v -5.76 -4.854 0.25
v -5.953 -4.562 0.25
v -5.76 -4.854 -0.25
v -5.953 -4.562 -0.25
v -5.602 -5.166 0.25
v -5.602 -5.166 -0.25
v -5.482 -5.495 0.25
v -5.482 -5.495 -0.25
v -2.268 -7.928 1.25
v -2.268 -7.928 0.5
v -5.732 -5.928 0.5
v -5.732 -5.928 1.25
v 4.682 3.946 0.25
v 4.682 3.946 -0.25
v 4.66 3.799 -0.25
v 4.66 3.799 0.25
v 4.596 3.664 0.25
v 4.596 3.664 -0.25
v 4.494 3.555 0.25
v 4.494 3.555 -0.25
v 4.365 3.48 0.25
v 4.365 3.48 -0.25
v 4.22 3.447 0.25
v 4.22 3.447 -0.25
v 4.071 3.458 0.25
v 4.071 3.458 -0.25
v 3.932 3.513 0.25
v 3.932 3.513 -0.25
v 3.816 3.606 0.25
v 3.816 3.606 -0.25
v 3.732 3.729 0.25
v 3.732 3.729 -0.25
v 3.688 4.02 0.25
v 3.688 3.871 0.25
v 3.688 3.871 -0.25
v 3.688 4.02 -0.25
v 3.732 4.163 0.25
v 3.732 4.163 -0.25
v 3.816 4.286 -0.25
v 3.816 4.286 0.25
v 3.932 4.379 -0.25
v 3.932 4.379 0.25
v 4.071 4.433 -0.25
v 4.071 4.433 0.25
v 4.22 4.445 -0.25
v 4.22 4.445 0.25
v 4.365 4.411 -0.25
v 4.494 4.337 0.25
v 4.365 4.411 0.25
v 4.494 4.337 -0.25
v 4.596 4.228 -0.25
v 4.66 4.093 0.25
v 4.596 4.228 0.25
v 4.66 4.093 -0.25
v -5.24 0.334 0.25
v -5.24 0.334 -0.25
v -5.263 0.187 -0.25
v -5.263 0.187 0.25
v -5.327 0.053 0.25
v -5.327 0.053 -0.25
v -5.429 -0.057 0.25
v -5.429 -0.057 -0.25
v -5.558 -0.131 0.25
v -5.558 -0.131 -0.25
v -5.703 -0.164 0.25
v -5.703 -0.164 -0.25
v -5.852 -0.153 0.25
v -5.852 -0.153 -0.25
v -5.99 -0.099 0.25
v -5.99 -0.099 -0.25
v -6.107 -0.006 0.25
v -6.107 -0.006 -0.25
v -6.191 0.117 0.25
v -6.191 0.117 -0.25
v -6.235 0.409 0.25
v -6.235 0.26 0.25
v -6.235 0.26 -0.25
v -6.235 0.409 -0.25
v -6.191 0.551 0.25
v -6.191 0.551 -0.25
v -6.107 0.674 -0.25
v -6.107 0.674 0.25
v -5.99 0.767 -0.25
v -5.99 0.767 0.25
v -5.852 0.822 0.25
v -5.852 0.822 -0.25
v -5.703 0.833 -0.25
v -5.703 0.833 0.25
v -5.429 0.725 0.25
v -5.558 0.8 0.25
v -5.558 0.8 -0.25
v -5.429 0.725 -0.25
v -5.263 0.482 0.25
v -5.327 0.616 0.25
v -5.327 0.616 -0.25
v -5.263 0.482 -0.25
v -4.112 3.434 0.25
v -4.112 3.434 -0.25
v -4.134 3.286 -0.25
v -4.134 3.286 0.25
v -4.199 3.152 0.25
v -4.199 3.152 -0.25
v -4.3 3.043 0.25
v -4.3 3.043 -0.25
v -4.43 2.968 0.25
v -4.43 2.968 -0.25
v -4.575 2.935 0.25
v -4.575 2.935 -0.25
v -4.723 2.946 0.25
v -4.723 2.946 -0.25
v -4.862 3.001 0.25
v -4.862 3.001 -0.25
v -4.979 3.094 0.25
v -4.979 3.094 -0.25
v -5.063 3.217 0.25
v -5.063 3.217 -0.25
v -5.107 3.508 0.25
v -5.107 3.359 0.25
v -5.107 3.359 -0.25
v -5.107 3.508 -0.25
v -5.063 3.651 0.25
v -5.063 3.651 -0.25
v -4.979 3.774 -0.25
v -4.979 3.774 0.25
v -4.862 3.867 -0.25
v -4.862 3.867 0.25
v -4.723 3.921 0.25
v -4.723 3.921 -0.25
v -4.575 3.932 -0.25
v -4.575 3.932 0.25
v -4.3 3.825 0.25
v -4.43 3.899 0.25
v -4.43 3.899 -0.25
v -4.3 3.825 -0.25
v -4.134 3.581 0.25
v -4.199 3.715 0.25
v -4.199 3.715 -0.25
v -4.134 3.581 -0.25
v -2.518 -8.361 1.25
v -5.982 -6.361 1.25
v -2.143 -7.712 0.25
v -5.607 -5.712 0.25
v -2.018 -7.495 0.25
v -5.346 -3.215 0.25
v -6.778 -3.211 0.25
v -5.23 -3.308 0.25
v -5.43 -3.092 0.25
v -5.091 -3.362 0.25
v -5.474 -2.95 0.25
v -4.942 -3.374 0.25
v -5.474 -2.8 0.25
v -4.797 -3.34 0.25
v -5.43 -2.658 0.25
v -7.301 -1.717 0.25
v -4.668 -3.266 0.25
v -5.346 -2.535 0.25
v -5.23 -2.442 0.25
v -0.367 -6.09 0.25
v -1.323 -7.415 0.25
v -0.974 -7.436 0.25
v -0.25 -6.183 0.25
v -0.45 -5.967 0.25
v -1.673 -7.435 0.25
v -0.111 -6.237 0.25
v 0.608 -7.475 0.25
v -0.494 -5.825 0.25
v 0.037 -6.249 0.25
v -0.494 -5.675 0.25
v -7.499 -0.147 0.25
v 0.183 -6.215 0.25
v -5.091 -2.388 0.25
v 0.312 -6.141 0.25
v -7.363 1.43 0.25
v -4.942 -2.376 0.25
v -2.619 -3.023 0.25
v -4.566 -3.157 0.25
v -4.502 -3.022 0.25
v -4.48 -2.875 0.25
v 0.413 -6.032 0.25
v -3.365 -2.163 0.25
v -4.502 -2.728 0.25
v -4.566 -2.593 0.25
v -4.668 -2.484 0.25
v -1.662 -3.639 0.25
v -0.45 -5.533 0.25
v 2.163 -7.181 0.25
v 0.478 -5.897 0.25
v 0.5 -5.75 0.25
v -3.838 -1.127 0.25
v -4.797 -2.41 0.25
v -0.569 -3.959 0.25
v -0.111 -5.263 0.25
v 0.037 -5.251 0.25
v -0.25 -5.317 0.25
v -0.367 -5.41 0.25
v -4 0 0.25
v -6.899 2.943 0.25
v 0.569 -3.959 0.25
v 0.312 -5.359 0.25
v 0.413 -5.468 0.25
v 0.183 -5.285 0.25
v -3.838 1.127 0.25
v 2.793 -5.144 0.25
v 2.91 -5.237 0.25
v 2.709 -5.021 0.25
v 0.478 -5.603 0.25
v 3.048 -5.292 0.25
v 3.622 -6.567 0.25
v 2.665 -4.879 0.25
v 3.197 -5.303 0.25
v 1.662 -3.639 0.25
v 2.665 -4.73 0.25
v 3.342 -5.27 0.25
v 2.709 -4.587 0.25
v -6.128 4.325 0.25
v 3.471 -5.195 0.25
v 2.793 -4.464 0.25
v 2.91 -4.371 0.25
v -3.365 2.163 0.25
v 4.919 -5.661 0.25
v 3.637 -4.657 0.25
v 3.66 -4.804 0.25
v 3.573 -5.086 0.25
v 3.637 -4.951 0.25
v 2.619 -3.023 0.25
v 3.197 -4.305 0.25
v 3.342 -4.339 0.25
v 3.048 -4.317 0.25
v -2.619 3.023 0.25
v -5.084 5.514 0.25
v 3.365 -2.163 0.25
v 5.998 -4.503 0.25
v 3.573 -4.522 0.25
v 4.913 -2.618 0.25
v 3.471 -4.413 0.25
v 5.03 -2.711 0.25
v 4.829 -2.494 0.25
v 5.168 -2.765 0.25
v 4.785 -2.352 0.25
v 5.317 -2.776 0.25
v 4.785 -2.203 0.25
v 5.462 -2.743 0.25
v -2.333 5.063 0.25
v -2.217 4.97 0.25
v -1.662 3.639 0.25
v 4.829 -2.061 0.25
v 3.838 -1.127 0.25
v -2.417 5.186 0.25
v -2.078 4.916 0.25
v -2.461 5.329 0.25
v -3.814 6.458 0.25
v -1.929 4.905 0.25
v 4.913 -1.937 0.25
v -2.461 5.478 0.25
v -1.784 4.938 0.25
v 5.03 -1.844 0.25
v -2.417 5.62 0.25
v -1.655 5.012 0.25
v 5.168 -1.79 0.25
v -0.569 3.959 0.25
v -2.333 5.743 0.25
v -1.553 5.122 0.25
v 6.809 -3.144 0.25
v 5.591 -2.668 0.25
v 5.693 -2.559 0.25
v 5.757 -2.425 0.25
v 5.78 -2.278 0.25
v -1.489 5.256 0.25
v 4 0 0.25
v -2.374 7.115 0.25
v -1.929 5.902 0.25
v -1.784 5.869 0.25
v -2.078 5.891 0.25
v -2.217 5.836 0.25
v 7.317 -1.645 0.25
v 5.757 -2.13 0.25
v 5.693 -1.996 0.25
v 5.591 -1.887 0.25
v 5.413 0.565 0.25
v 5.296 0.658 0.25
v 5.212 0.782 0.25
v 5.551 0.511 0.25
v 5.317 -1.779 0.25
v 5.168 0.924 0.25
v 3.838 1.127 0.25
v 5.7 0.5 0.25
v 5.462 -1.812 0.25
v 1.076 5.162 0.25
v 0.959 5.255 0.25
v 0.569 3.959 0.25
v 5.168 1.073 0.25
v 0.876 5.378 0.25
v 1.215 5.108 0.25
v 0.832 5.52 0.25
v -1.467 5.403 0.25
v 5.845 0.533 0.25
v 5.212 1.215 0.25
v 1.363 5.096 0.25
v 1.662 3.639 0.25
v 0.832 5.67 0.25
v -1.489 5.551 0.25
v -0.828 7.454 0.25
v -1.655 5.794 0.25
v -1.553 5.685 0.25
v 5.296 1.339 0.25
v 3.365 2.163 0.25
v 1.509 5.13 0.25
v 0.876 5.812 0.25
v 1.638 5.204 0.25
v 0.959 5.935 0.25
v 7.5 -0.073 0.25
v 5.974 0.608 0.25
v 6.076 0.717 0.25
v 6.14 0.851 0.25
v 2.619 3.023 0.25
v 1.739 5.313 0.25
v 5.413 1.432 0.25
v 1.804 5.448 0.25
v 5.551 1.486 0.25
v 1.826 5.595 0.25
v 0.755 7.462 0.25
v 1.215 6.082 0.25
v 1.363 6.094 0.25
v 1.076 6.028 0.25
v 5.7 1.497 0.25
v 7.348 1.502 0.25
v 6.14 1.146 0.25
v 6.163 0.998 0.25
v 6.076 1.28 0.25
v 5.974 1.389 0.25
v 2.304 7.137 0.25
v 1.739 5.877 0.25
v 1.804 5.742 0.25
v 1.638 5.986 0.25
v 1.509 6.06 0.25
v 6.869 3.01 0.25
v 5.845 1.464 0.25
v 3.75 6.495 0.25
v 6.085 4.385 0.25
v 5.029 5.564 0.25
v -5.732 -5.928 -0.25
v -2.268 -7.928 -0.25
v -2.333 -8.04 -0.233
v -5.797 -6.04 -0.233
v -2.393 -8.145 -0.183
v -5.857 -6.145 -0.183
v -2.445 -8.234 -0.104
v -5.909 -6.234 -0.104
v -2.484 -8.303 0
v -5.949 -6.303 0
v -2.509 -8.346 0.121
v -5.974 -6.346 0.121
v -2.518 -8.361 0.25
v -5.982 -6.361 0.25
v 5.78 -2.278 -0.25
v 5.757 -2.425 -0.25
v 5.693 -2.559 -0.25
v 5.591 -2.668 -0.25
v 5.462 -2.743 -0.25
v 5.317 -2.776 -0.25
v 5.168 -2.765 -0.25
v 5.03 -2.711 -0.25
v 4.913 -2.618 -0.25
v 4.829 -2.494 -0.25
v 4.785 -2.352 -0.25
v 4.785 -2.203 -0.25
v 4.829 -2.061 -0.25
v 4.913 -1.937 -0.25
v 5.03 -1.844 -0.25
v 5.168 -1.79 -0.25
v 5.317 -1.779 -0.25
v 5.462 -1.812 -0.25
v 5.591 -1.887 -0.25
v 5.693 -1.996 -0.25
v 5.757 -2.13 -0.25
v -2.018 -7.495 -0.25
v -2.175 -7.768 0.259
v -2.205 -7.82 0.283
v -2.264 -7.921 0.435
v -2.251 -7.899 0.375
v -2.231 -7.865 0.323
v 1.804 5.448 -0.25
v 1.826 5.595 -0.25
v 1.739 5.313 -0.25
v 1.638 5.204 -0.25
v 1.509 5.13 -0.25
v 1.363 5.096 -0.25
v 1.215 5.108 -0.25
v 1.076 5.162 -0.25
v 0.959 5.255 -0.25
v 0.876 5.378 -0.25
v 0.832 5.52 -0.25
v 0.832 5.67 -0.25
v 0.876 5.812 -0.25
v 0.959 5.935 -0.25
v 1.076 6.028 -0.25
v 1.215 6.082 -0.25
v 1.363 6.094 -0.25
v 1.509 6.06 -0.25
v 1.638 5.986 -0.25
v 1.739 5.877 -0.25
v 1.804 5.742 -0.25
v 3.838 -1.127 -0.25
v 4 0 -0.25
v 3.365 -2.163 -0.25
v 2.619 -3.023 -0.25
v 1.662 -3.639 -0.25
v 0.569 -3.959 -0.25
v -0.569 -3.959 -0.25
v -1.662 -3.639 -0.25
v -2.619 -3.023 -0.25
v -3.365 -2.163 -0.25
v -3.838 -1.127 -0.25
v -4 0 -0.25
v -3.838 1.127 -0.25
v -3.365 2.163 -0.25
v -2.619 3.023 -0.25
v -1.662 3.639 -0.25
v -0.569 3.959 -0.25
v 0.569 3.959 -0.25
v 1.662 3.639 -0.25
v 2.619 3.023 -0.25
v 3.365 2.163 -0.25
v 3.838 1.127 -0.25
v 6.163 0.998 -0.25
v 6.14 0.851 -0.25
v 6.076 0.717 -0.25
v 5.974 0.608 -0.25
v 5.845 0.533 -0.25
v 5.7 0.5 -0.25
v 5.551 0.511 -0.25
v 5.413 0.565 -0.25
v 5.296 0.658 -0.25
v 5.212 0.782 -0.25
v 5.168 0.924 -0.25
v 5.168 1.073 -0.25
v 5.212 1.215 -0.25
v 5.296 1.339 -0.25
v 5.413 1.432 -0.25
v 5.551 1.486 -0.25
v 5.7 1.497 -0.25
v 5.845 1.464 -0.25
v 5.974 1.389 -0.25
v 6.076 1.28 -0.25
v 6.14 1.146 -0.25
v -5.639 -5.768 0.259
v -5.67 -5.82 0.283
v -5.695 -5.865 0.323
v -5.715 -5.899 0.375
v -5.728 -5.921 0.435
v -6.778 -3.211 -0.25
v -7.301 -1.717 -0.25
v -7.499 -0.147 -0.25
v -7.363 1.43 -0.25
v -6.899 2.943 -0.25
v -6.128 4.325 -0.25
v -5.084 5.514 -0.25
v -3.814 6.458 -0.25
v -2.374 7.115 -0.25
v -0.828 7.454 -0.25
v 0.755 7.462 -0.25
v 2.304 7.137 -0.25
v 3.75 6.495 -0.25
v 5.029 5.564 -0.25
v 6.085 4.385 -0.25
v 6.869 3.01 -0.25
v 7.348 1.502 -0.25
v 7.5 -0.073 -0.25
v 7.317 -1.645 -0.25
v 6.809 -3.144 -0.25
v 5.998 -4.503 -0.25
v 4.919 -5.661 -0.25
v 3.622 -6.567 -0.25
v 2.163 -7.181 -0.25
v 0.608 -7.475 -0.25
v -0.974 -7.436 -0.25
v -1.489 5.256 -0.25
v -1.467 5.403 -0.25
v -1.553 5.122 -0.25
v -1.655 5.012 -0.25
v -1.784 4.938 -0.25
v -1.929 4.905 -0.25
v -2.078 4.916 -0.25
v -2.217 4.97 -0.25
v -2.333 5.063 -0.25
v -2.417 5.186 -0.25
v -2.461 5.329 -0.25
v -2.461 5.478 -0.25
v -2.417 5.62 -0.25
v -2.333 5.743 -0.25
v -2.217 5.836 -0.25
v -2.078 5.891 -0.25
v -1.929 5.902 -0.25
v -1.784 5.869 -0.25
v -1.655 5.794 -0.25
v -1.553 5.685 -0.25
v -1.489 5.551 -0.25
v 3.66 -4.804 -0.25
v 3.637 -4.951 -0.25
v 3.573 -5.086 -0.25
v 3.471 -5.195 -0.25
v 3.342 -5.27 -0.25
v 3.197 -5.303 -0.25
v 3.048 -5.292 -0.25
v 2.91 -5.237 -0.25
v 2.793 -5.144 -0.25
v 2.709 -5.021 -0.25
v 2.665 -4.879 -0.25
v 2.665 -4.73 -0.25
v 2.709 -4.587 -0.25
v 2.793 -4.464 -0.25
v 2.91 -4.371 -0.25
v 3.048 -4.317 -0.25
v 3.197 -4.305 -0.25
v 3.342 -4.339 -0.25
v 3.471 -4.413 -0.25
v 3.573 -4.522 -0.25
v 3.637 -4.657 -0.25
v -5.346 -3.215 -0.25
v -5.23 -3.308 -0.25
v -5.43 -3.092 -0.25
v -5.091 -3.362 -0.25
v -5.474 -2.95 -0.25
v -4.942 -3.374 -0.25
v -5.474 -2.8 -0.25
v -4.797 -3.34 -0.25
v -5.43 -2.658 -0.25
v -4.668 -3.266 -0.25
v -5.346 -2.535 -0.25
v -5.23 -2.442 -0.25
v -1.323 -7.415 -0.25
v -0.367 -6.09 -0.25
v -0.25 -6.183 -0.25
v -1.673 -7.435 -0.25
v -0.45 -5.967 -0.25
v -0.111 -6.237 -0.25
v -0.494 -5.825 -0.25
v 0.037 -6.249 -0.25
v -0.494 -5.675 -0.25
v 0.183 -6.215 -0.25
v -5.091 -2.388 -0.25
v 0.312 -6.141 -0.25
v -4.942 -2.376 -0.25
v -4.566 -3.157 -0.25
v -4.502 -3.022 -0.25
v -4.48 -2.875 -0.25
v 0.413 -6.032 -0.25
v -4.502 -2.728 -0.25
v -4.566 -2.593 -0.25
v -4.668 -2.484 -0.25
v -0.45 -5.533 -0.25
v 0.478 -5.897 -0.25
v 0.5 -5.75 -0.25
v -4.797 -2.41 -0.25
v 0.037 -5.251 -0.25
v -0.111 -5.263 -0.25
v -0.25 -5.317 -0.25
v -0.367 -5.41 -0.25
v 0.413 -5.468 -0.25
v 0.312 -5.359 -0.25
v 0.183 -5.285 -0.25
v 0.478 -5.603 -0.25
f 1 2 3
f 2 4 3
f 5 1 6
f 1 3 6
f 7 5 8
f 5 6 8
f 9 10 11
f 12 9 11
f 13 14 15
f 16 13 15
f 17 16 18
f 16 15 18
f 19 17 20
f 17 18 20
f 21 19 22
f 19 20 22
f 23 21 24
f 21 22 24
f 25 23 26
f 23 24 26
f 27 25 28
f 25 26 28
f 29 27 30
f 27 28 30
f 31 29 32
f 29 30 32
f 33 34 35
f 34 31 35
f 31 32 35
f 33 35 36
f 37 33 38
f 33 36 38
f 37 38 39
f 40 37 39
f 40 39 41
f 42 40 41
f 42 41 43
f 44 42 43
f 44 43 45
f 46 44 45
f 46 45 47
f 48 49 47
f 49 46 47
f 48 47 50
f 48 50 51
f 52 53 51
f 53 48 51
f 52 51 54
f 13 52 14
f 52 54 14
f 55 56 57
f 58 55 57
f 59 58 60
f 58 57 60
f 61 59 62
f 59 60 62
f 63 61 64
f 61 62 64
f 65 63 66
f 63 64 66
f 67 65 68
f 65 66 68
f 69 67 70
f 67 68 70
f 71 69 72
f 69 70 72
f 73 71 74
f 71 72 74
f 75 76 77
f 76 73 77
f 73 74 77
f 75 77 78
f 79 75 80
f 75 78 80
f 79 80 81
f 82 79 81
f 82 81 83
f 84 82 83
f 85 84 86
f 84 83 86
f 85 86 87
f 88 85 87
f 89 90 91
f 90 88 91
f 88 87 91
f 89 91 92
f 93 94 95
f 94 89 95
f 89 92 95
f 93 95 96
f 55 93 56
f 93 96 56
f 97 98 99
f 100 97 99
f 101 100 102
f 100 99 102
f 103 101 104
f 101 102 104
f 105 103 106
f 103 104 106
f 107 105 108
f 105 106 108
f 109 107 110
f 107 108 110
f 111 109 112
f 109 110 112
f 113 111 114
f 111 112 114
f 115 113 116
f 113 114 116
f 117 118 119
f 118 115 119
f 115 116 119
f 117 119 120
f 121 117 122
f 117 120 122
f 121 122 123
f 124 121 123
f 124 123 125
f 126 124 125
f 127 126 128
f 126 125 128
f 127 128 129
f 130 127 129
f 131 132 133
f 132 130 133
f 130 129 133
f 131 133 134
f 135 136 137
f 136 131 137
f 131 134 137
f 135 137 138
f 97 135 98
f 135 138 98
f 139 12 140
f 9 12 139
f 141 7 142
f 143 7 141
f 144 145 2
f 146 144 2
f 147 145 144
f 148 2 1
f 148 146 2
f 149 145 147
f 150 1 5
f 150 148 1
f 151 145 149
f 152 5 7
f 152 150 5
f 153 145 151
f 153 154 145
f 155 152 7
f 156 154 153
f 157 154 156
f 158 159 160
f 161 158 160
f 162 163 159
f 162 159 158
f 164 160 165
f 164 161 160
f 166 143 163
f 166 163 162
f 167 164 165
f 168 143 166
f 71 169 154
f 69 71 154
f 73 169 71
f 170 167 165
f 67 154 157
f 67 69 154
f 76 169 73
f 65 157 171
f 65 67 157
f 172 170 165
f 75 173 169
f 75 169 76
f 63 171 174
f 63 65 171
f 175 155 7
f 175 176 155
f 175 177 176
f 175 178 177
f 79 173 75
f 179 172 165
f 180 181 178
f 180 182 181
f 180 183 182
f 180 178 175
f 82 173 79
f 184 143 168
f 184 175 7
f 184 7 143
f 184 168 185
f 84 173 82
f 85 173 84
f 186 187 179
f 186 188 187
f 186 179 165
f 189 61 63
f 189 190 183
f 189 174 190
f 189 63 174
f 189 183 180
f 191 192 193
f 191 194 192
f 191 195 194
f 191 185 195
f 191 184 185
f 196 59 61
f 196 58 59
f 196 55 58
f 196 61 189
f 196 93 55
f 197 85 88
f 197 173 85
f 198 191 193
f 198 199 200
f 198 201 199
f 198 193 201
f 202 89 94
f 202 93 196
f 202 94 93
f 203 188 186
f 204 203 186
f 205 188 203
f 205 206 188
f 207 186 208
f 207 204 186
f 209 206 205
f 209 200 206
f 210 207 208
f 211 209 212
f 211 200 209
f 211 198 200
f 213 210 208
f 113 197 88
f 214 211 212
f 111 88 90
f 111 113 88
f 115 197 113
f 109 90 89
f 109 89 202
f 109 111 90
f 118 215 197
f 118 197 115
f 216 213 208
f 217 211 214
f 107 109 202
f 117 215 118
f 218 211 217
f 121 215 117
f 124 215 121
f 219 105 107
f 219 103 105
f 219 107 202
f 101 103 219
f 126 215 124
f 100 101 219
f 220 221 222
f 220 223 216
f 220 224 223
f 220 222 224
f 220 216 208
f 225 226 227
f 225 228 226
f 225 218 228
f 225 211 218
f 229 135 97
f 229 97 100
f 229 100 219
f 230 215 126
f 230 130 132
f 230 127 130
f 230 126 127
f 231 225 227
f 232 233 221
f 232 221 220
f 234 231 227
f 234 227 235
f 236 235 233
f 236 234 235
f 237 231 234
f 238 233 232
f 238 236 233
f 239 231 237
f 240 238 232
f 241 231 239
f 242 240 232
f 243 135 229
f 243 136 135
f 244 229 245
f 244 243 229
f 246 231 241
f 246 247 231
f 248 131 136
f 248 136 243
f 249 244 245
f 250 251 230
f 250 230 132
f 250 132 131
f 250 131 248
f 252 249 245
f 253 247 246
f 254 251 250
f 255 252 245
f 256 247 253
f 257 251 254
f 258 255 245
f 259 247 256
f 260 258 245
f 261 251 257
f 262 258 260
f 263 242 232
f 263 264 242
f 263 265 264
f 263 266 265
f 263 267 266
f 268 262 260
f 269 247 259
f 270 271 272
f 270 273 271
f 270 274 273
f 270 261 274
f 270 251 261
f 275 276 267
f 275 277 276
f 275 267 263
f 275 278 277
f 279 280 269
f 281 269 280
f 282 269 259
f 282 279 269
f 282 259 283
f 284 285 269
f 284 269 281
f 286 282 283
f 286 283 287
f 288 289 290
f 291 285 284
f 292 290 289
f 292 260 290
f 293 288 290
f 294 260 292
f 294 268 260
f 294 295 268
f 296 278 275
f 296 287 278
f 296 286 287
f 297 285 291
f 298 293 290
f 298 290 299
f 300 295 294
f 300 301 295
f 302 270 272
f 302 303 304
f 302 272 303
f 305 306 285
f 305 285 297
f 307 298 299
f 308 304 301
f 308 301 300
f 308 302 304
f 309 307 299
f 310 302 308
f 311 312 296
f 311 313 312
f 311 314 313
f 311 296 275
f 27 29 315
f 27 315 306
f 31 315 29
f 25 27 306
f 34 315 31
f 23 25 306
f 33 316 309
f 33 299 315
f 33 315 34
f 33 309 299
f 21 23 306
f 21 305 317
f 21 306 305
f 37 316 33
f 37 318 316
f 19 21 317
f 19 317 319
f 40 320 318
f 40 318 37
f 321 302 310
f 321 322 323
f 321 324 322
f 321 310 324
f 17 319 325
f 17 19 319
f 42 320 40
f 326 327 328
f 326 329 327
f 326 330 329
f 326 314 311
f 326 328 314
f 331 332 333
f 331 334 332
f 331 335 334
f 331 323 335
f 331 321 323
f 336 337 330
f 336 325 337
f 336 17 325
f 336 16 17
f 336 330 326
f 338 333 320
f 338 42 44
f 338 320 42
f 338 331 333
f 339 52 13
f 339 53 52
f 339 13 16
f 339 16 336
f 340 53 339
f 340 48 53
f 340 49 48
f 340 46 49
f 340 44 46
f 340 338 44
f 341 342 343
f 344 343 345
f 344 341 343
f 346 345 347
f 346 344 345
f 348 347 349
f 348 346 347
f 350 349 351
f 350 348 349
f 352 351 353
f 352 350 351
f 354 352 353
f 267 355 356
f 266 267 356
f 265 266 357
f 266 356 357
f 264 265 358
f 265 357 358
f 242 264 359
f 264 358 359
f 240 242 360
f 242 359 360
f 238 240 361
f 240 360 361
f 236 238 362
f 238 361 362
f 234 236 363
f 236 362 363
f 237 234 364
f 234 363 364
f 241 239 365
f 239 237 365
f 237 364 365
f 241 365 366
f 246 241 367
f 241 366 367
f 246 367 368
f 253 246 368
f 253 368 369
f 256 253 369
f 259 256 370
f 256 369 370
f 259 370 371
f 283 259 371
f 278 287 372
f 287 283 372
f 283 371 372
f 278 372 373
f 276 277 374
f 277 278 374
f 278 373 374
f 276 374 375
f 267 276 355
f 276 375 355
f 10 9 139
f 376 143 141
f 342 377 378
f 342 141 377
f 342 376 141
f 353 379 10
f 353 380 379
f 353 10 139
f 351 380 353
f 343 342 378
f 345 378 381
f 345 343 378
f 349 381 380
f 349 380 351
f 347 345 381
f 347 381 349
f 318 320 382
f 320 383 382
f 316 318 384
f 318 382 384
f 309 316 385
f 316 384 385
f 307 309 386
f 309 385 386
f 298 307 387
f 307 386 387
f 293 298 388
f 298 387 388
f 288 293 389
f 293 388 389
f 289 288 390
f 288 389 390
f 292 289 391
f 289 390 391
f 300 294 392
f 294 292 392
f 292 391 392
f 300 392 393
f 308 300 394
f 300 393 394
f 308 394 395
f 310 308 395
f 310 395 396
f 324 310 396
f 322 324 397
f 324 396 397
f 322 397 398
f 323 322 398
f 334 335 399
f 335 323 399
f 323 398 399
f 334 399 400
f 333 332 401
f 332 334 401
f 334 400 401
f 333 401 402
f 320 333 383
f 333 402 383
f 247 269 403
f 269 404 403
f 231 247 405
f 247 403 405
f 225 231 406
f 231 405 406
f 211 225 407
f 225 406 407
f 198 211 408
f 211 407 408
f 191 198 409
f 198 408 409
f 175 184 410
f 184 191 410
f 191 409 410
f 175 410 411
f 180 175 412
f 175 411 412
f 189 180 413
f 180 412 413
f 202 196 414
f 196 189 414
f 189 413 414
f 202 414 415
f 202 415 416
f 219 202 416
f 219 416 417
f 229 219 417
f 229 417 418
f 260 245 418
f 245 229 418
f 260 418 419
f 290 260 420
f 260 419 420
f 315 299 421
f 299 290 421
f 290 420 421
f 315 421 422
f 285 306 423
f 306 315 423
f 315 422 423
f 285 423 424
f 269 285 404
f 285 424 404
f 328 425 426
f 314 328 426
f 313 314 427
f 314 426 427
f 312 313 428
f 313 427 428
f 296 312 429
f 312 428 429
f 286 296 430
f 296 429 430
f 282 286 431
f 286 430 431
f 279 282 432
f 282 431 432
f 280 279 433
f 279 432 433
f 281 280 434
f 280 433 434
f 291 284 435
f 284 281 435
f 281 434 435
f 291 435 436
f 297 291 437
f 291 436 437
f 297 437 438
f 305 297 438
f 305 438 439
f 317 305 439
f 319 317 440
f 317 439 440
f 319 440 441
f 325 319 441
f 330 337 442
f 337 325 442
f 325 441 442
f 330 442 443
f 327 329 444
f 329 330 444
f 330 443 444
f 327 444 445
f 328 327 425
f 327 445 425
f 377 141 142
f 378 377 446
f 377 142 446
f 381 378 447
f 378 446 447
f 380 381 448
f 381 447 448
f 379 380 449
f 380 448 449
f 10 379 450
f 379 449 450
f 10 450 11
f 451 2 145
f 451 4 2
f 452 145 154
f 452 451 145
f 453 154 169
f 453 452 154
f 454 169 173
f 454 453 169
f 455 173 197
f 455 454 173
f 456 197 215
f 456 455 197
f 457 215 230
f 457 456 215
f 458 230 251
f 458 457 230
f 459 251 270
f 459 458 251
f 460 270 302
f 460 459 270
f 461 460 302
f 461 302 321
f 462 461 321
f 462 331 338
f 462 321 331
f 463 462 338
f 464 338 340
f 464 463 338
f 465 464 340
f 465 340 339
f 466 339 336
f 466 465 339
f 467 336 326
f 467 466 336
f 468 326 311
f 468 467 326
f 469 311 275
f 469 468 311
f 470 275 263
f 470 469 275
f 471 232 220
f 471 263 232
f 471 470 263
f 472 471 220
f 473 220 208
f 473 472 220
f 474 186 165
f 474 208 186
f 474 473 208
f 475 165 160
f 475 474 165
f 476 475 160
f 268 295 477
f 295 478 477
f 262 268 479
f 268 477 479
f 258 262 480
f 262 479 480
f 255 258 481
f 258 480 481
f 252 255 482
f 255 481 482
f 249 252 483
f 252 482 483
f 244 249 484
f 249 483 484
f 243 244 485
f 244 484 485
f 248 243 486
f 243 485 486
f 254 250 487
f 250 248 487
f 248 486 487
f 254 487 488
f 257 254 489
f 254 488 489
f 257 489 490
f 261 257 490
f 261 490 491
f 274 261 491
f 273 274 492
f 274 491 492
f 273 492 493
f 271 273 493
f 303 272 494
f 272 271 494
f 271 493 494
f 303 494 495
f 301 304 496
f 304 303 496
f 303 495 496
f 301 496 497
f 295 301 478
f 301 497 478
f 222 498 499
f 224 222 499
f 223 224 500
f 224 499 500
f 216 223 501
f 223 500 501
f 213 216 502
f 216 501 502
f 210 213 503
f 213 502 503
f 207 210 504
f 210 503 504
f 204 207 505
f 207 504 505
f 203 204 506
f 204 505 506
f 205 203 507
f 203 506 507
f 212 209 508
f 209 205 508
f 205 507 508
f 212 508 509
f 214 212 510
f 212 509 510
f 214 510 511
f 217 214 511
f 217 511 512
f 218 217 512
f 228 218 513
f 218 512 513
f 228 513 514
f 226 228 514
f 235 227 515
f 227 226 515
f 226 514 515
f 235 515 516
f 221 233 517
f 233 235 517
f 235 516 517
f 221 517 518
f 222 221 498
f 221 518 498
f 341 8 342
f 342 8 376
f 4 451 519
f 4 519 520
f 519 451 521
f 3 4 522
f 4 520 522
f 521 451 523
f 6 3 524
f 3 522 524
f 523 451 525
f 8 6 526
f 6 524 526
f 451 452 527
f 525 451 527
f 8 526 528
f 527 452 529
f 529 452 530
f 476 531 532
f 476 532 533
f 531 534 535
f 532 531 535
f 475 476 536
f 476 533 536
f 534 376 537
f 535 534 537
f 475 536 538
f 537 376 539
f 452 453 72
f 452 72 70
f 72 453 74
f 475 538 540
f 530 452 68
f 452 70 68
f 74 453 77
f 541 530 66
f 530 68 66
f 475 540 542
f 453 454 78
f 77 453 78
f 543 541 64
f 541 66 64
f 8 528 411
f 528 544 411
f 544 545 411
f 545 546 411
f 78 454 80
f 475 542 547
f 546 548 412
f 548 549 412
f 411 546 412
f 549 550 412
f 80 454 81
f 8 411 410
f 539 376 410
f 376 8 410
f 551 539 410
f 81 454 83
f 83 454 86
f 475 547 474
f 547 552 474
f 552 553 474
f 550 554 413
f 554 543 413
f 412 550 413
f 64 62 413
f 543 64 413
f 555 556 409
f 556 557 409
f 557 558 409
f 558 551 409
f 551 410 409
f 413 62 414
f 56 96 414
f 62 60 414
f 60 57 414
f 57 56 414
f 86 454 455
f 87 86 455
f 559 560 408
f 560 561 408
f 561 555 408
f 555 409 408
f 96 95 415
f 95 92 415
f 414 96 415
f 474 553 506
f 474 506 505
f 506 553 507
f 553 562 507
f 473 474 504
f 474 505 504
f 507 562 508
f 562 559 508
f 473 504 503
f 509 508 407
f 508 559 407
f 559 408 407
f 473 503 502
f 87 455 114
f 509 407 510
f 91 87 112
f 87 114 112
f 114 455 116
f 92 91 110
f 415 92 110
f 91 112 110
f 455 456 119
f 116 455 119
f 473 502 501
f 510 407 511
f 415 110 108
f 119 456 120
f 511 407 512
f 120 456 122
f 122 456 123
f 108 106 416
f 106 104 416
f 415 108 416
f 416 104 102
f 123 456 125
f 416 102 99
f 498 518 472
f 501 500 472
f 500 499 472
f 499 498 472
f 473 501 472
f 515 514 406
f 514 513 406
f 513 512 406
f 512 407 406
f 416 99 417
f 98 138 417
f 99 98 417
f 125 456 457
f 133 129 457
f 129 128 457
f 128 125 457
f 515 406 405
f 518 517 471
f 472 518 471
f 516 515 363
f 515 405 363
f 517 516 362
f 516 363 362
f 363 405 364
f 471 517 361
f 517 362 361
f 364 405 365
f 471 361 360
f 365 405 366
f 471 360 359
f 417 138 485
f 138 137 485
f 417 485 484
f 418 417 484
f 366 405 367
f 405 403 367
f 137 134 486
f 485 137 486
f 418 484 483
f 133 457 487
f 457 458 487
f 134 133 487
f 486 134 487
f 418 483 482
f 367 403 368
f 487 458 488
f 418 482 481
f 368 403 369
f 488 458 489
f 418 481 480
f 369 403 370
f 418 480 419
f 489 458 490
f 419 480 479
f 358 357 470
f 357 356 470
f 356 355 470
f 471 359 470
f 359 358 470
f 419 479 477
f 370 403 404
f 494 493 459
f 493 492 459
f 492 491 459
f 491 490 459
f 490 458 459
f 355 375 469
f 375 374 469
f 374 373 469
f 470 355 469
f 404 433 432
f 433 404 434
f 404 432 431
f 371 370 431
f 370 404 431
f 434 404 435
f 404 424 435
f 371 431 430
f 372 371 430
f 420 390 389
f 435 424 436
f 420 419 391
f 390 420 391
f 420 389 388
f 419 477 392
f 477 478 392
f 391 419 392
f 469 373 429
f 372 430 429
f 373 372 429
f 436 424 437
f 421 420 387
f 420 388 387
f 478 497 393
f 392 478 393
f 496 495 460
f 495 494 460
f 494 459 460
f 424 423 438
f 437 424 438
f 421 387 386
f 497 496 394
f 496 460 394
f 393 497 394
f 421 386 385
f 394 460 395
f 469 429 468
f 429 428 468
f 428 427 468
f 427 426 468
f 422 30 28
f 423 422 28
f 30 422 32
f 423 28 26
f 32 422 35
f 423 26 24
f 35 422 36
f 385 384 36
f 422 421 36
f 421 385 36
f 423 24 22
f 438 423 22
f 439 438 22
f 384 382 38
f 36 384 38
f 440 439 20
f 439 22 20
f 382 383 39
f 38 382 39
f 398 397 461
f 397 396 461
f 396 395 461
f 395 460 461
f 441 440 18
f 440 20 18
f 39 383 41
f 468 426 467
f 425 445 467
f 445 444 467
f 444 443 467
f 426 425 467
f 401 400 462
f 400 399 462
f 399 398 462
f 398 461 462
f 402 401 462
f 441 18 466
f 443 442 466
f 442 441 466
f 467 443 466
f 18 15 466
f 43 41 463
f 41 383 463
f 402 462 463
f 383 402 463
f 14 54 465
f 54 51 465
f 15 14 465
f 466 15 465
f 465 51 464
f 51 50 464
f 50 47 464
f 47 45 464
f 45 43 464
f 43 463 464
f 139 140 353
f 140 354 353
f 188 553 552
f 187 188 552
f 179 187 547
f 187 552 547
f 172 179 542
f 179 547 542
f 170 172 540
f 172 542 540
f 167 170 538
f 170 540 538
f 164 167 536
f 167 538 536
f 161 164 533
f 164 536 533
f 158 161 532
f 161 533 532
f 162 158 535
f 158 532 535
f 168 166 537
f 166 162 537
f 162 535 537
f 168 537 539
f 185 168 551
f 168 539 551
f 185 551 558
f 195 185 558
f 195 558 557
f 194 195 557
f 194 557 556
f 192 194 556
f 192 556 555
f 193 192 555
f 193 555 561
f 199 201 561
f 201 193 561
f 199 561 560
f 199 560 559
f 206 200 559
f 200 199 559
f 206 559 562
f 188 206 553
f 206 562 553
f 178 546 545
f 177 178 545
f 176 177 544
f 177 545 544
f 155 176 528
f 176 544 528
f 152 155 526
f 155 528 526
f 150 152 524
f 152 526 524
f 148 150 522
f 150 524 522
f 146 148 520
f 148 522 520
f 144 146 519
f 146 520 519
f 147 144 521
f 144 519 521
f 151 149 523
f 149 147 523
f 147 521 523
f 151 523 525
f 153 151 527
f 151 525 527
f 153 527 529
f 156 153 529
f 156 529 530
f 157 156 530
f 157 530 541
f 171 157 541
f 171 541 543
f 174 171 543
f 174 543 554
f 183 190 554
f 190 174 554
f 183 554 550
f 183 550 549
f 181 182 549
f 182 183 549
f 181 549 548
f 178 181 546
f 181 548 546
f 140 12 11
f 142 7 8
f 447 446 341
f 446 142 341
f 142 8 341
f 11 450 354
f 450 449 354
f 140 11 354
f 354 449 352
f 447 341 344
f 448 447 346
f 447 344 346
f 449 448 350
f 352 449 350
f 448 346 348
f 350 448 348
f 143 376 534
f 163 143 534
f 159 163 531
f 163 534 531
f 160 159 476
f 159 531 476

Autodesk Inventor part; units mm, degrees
ref_plane "YZ Plane" through (0, 0, 0) normal (1, 0, 0) x (0, 1, 0)
ref_plane "XZ Plane" through (0, 0, 0) normal (0, 1, 0) x (-1, 0, 0)
ref_plane "XY Plane" through (0, 0, 0) normal (0, 0, 1) x (1, 0, 0)
sketch "Szkic1" plane through (0, 0, 0) normal (0, 0, 1) x (1, 0, 0)
  arc A0 (-0.9737, -7.4365) -> (-5.9534, -4.5615) centre (0, 0) ccw
  circle A1 centre (0, 0) radius 4
  circle A2 centre (0, -5.75) radius 0.5
  circle A3 centre (3.1597, -4.8041) radius 0.5
  circle A4 centre (5.2797, -2.2775) radius 0.5
  circle A5 centre (5.6626, 0.9985) radius 0.5
  circle A6 centre (4.1824, 3.9459) radius 0.5
  circle A7 centre (1.326, 5.595) radius 0.5
  circle A8 centre (-1.9666, 5.4032) radius 0.5
  circle A9 centre (-4.6122, 3.4337) radius 0.5
  circle A10 centre (-5.7403, 0.3343) radius 0.5
  circle A11 centre (-4.9796, -2.875) radius 0.5
  arc A12 (-5.4821, -5.4952) -> (-5.9534, -4.5615) centre (-8.3548, -6.3596) ccw
  arc A13 (-0.9737, -7.4365) -> (-2.0179, -7.4952) centre (-1.3301, -10.4153) ccw
  line L0 (-5.4821, -5.4952) -> (-5.9821, -6.3612)
  line L1 (-2.0179, -7.4952) -> (-2.5179, -8.3612)
  line L2 (-2.5179, -8.3612) -> (-5.9821, -6.3612)
  dimension "d0" = 15
  dimension "d1" = 8
  dimension "d2" = 1
  dimension "d5" = 300
extrude "Wyciągnięcie proste1" add sketch "Szkic1" along normal mid plane 0.5
sketch "Szkic2" plane through (0, 0, 0.25) normal (0, 0, 1) x (1, 0, 0)
  line L0 (-5.9821, -6.3612) -> (-2.5179, -8.3612)
  line L1 (-2.2679, -7.9282) -> (-5.7321, -5.9282)
  line L2 (-5.7321, -5.9282) -> (-5.9821, -6.3612)
  line L3 (-2.2679, -7.9282) -> (-2.5179, -8.3612)
extrude "Wyciągnięcie proste2" add sketch "Szkic2" along normal blind 1
fillet "Zaokrąglenie1" radius 0.5 1 edges at (-4.25, -7.3612, -0.25)
fillet "Zaokrąglenie2" radius 0.25 1 edges at (-4, -6.9282, 0.25)
properties part number "SŁONECZKO MAŁE Z BLOKADĄ" material "Stal"
